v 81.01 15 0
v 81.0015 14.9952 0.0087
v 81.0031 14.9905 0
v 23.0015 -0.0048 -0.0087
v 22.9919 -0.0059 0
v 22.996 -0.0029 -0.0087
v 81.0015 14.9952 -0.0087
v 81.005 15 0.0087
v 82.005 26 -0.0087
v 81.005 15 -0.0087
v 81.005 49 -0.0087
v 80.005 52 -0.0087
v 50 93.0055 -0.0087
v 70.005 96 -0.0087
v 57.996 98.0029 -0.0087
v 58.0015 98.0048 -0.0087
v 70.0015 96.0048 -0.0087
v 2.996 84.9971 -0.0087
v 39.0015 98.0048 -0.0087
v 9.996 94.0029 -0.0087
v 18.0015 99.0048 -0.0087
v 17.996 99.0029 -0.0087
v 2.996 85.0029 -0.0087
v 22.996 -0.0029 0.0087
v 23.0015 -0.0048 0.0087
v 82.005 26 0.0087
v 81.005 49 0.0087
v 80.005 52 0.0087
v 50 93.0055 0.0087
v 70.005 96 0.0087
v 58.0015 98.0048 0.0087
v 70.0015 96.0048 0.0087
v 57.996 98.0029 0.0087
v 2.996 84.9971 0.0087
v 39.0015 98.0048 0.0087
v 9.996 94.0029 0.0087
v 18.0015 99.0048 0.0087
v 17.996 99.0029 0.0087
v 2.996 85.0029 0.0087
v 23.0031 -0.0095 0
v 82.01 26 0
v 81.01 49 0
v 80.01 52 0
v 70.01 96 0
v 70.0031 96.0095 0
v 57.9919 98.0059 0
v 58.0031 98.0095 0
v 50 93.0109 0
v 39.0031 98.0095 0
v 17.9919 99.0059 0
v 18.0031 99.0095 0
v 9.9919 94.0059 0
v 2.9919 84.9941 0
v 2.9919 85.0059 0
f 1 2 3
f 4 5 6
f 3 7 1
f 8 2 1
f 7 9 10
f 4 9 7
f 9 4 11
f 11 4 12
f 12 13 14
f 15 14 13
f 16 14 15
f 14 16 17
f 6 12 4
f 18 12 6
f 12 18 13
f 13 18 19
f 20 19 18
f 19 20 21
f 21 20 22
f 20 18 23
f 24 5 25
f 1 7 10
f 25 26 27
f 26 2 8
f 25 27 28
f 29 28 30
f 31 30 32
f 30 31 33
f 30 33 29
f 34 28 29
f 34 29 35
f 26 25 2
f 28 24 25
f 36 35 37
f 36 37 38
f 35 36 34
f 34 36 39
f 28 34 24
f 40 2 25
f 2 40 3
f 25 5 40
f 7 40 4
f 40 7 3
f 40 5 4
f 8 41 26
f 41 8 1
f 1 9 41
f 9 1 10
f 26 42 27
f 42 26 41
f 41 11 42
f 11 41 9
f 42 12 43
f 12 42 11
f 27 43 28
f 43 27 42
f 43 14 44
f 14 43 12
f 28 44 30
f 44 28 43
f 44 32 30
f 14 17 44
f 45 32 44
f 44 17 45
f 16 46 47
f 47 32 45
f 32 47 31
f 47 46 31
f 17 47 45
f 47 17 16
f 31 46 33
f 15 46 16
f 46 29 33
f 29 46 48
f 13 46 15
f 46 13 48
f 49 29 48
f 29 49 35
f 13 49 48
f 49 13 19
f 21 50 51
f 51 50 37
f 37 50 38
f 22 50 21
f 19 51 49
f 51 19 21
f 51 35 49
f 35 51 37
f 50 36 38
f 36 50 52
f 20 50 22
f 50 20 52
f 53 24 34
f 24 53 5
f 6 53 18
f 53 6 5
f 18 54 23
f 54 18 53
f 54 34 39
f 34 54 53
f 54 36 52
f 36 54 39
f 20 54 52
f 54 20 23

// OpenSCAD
color([0.6015236368594579,0.5872808850844162,0.28390336255679416]) hull(){
    translate([23,0]) sphere(0.01);
    translate([81,15]) sphere(0.01);
    translate([64,14]) sphere(0.01);
}
color([0.5839405385485582,0.4048698908705002,0.6877557316706271]) hull(){
    translate([81,15]) sphere(0.01);
    translate([82,26]) sphere(0.01);
    translate([68,15]) sphere(0.01);
}
color([0.29310936231965135,0.08456113000314536,0.6409271470126323]) hull(){
    translate([82,26]) sphere(0.01);
    translate([64,14]) sphere(0.01);
    translate([68,15]) sphere(0.01);
}
color([0.38512246522478266,0.6162859510128613,0.407224705538046]) hull(){
    translate([64,14]) sphere(0.01);
    translate([81,15]) sphere(0.01);
    translate([68,15]) sphere(0.01);
}
color([0.6107800780239486,0.9541913078580654,0.09369719926319908]) hull(){
    translate([82,26]) sphere(0.01);
    translate([23,0]) sphere(0.01);
    translate([72,20]) sphere(0.01);
}
color([0.4396226851829427,0.9817497074141792,0.30111933510979894]) hull(){
    translate([23,0]) sphere(0.01);
    translate([64,14]) sphere(0.01);
    translate([72,20]) sphere(0.01);
}
color([0.08571041628526821,0.691130580335744,0.16573157374072334]) hull(){
    translate([64,14]) sphere(0.01);
    translate([82,26]) sphere(0.01);
    translate([72,20]) sphere(0.01);
}
color([0.4668304924867862,0.30100213617539295,0.3511677492745029]) hull(){
    translate([23,0]) sphere(0.01);
    translate([82,26]) sphere(0.01);
    translate([81,49]) sphere(0.01);
}
color([0.05564944269037686,0.7696481469448815,0.686275624239137]) hull(){
    translate([23,0]) sphere(0.01);
    translate([81,49]) sphere(0.01);
    translate([80,52]) sphere(0.01);
}
color([0.15447252119296884,0.35335085758162643,0.18799175914388588]) hull(){
    translate([23,0]) sphere(0.01);
    translate([80,52]) sphere(0.01);
    translate([58,33]) sphere(0.01);
}
color([0.41322879780265653,0.82270842281296,0.9057146612667819]) hull(){
    translate([42,29]) sphere(0.01);
    translate([23,0]) sphere(0.01);
    translate([58,33]) sphere(0.01);
}
color([0.9688547633127277,0.5528378273263655,0.12760284187612392]) hull(){
    translate([80,52]) sphere(0.01);
    translate([42,29]) sphere(0.01);
    translate([77,50]) sphere(0.01);
}
color([0.1710979555253146,0.7131998843266452,0.6397779425125977]) hull(){
    translate([42,29]) sphere(0.01);
    translate([58,33]) sphere(0.01);
    translate([77,50]) sphere(0.01);
}
color([0.57496968906483,0.8489371230716904,0.07944838941339594]) hull(){
    translate([58,33]) sphere(0.01);
    translate([80,52]) sphere(0.01);
    translate([77,50]) sphere(0.01);
}
color([0.040333123224873146,0.9305910632054132,0.3080440975445232]) hull(){
    translate([80,52]) sphere(0.01);
    translate([70,96]) sphere(0.01);
    translate([42,29]) sphere(0.01);
}
color([0.6084655882345898,0.4923441190446234,0.7069385087242315]) hull(){
    translate([70,96]) sphere(0.01);
    translate([23,0]) sphere(0.01);
    translate([59,71]) sphere(0.01);
}
color([0.6803385961846494,0.18024793645131376,0.10787678186317007]) hull(){
    translate([23,0]) sphere(0.01);
    translate([42,29]) sphere(0.01);
    translate([59,71]) sphere(0.01);
}
color([0.1335624130282893,0.47731112778056706,0.8393950916733898]) hull(){
    translate([42,29]) sphere(0.01);
    translate([70,96]) sphere(0.01);
    translate([59,71]) sphere(0.01);
}
color([0.6780893207968227,0.08337096158279222,0.27725115680544954]) hull(){
    translate([23,0]) sphere(0.01);
    translate([70,96]) sphere(0.01);
    translate([44,47]) sphere(0.01);
}
color([0.9965791662073833,0.03375154870506614,0.10494976972159242]) hull(){
    translate([70,96]) sphere(0.01);
    translate([44,55]) sphere(0.01);
    translate([44,47]) sphere(0.01);
}
color([0.516844917539197,0.1360610465034362,0.543805910213663]) hull(){
    translate([44,55]) sphere(0.01);
    translate([23,0]) sphere(0.01);
    translate([44,47]) sphere(0.01);
}
color([0.04901628196141694,0.4867102513994055,0.8813892002857401]) hull(){
    translate([70,96]) sphere(0.01);
    translate([58,98]) sphere(0.01);
    translate([44,55]) sphere(0.01);
}
color([0.3053751014353143,0.40772022041766365,0.31297204198076634]) hull(){
    translate([58,98]) sphere(0.01);
    translate([23,0]) sphere(0.01);
    translate([44,55]) sphere(0.01);
}
color([0.49907796034366436,0.6160709555012981,0.9916538905911245]) hull(){
    translate([23,0]) sphere(0.01);
    translate([58,98]) sphere(0.01);
    translate([50,93]) sphere(0.01);
}
color([0.3123575451593331,0.46364206475662195,0.8862899719975306]) hull(){
    translate([23,0]) sphere(0.01);
    translate([50,93]) sphere(0.01);
    translate([35,48]) sphere(0.01);
}
color([0.5738800220993816,0.8494037217359881,0.24323676398212035]) hull(){
    translate([50,93]) sphere(0.01);
    translate([39,98]) sphere(0.01);
    translate([35,48]) sphere(0.01);
}
color([0.8402878098664139,0.9530478541805099,0.16594803365564914]) hull(){
    translate([39,98]) sphere(0.01);
    translate([23,0]) sphere(0.01);
    translate([35,48]) sphere(0.01);
}
color([0.0023370868964924796,0.7387895340607371,0.5374530602666081]) hull(){
    translate([23,0]) sphere(0.01);
    translate([39,98]) sphere(0.01);
    translate([26,22]) sphere(0.01);
}
color([0.25604025835089217,0.4320068924153808,0.5112453323210508]) hull(){
    translate([39,98]) sphere(0.01);
    translate([24,21]) sphere(0.01);
    translate([26,22]) sphere(0.01);
}
color([0.7462272619347637,0.5039790716190428,0.8850839351693509]) hull(){
    translate([24,21]) sphere(0.01);
    translate([23,0]) sphere(0.01);
    translate([26,22]) sphere(0.01);
}
color([0.6652757233710683,0.22263754843686523,0.08942086350367451]) hull(){
    translate([24,21]) sphere(0.01);
    translate([39,98]) sphere(0.01);
    translate([30,57]) sphere(0.01);
}
color([0.6195232841458308,0.9036720387350747,0.7222923954673625]) hull(){
    translate([39,98]) sphere(0.01);
    translate([26,51]) sphere(0.01);
    translate([30,57]) sphere(0.01);
}
color([0.6665075097113882,0.5421139713900744,0.6943978877819516]) hull(){
    translate([26,51]) sphere(0.01);
    translate([24,21]) sphere(0.01);
    translate([30,57]) sphere(0.01);
}
color([0.9269770591996176,0.12480324665016229,0.8422397758241813]) hull(){
    translate([18,99]) sphere(0.01);
    translate([23,0]) sphere(0.01);
    translate([24,21]) sphere(0.01);
}
color([0.028249143050612435,0.8554899328562455,0.6212809598996976]) hull(){
    translate([18,99]) sphere(0.01);
    translate([24,21]) sphere(0.01);
    translate([20,83]) sphere(0.01);
}
color([0.6435486749275994,0.4857227915978113,0.2898251547629681]) hull(){
    translate([24,21]) sphere(0.01);
    translate([26,51]) sphere(0.01);
    translate([20,83]) sphere(0.01);
}
color([0.21709076393122206,0.4979948584580751,0.6176241526046676]) hull(){
    translate([26,51]) sphere(0.01);
    translate([18,99]) sphere(0.01);
    translate([20,83]) sphere(0.01);
}
color([0.4722249532281336,0.7228331534363125,0.6109414561657331]) hull(){
    translate([39,98]) sphere(0.01);
    translate([18,99]) sphere(0.01);
    translate([22,90]) sphere(0.01);
}
color([0.5330085163671737,0.6769359871291822,0.5973748769978083]) hull(){
    translate([18,99]) sphere(0.01);
    translate([26,51]) sphere(0.01);
    translate([22,90]) sphere(0.01);
}
color([0.14460255854654236,0.21273280877313017,0.8417179364881341]) hull(){
    translate([26,51]) sphere(0.01);
    translate([39,98]) sphere(0.01);
    translate([22,90]) sphere(0.01);
}
color([0.6300391880279899,0.5103677782275869,0.4479627161837708]) hull(){
    translate([23,0]) sphere(0.01);
    translate([18,99]) sphere(0.01);
    translate([18,58]) sphere(0.01);
}
color([0.2903518628620462,0.1744676713524972,0.5457372127765215]) hull(){
    translate([10,94]) sphere(0.01);
    translate([23,0]) sphere(0.01);
    translate([18,58]) sphere(0.01);
}
color([0.6340658375422632,0.7004271366493812,0.690956934786038]) hull(){
    translate([18,99]) sphere(0.01);
    translate([10,94]) sphere(0.01);
    translate([16,79]) sphere(0.01);
}
color([0.013948469234104865,0.8018456354370093,0.2607079205191076]) hull(){
    translate([10,94]) sphere(0.01);
    translate([18,58]) sphere(0.01);
    translate([16,79]) sphere(0.01);
}
color([0.01899716010339858,0.7507132946374245,0.44168653561511173]) hull(){
    translate([18,58]) sphere(0.01);
    translate([18,99]) sphere(0.01);
    translate([16,79]) sphere(0.01);
}
color([0.1668653701245908,0.45955837321901094,0.7876756969907556]) hull(){
    translate([23,0]) sphere(0.01);
    translate([10,94]) sphere(0.01);
    translate([18,24]) sphere(0.01);
}
color([0.09564527702692727,0.06733136152719421,0.7816649665975636]) hull(){
    translate([3,85]) sphere(0.01);
    translate([23,0]) sphere(0.01);
    translate([18,24]) sphere(0.01);
}
color([0.030385075649315252,0.33346286891595733,0.08647112242809318]) hull(){
    translate([10,94]) sphere(0.01);
    translate([3,85]) sphere(0.01);
    translate([6,84]) sphere(0.01);
}
color([0.8161439782233904,0.05657658467482607,0.8243668117903717]) hull(){
    translate([3,85]) sphere(0.01);
    translate([18,24]) sphere(0.01);
    translate([6,84]) sphere(0.01);
}
color([0.05808931884644186,0.6181904095369413,0.1426995958976538]) hull(){
    translate([18,24]) sphere(0.01);
    translate([10,94]) sphere(0.01);
    translate([6,84]) sphere(0.01);
}
